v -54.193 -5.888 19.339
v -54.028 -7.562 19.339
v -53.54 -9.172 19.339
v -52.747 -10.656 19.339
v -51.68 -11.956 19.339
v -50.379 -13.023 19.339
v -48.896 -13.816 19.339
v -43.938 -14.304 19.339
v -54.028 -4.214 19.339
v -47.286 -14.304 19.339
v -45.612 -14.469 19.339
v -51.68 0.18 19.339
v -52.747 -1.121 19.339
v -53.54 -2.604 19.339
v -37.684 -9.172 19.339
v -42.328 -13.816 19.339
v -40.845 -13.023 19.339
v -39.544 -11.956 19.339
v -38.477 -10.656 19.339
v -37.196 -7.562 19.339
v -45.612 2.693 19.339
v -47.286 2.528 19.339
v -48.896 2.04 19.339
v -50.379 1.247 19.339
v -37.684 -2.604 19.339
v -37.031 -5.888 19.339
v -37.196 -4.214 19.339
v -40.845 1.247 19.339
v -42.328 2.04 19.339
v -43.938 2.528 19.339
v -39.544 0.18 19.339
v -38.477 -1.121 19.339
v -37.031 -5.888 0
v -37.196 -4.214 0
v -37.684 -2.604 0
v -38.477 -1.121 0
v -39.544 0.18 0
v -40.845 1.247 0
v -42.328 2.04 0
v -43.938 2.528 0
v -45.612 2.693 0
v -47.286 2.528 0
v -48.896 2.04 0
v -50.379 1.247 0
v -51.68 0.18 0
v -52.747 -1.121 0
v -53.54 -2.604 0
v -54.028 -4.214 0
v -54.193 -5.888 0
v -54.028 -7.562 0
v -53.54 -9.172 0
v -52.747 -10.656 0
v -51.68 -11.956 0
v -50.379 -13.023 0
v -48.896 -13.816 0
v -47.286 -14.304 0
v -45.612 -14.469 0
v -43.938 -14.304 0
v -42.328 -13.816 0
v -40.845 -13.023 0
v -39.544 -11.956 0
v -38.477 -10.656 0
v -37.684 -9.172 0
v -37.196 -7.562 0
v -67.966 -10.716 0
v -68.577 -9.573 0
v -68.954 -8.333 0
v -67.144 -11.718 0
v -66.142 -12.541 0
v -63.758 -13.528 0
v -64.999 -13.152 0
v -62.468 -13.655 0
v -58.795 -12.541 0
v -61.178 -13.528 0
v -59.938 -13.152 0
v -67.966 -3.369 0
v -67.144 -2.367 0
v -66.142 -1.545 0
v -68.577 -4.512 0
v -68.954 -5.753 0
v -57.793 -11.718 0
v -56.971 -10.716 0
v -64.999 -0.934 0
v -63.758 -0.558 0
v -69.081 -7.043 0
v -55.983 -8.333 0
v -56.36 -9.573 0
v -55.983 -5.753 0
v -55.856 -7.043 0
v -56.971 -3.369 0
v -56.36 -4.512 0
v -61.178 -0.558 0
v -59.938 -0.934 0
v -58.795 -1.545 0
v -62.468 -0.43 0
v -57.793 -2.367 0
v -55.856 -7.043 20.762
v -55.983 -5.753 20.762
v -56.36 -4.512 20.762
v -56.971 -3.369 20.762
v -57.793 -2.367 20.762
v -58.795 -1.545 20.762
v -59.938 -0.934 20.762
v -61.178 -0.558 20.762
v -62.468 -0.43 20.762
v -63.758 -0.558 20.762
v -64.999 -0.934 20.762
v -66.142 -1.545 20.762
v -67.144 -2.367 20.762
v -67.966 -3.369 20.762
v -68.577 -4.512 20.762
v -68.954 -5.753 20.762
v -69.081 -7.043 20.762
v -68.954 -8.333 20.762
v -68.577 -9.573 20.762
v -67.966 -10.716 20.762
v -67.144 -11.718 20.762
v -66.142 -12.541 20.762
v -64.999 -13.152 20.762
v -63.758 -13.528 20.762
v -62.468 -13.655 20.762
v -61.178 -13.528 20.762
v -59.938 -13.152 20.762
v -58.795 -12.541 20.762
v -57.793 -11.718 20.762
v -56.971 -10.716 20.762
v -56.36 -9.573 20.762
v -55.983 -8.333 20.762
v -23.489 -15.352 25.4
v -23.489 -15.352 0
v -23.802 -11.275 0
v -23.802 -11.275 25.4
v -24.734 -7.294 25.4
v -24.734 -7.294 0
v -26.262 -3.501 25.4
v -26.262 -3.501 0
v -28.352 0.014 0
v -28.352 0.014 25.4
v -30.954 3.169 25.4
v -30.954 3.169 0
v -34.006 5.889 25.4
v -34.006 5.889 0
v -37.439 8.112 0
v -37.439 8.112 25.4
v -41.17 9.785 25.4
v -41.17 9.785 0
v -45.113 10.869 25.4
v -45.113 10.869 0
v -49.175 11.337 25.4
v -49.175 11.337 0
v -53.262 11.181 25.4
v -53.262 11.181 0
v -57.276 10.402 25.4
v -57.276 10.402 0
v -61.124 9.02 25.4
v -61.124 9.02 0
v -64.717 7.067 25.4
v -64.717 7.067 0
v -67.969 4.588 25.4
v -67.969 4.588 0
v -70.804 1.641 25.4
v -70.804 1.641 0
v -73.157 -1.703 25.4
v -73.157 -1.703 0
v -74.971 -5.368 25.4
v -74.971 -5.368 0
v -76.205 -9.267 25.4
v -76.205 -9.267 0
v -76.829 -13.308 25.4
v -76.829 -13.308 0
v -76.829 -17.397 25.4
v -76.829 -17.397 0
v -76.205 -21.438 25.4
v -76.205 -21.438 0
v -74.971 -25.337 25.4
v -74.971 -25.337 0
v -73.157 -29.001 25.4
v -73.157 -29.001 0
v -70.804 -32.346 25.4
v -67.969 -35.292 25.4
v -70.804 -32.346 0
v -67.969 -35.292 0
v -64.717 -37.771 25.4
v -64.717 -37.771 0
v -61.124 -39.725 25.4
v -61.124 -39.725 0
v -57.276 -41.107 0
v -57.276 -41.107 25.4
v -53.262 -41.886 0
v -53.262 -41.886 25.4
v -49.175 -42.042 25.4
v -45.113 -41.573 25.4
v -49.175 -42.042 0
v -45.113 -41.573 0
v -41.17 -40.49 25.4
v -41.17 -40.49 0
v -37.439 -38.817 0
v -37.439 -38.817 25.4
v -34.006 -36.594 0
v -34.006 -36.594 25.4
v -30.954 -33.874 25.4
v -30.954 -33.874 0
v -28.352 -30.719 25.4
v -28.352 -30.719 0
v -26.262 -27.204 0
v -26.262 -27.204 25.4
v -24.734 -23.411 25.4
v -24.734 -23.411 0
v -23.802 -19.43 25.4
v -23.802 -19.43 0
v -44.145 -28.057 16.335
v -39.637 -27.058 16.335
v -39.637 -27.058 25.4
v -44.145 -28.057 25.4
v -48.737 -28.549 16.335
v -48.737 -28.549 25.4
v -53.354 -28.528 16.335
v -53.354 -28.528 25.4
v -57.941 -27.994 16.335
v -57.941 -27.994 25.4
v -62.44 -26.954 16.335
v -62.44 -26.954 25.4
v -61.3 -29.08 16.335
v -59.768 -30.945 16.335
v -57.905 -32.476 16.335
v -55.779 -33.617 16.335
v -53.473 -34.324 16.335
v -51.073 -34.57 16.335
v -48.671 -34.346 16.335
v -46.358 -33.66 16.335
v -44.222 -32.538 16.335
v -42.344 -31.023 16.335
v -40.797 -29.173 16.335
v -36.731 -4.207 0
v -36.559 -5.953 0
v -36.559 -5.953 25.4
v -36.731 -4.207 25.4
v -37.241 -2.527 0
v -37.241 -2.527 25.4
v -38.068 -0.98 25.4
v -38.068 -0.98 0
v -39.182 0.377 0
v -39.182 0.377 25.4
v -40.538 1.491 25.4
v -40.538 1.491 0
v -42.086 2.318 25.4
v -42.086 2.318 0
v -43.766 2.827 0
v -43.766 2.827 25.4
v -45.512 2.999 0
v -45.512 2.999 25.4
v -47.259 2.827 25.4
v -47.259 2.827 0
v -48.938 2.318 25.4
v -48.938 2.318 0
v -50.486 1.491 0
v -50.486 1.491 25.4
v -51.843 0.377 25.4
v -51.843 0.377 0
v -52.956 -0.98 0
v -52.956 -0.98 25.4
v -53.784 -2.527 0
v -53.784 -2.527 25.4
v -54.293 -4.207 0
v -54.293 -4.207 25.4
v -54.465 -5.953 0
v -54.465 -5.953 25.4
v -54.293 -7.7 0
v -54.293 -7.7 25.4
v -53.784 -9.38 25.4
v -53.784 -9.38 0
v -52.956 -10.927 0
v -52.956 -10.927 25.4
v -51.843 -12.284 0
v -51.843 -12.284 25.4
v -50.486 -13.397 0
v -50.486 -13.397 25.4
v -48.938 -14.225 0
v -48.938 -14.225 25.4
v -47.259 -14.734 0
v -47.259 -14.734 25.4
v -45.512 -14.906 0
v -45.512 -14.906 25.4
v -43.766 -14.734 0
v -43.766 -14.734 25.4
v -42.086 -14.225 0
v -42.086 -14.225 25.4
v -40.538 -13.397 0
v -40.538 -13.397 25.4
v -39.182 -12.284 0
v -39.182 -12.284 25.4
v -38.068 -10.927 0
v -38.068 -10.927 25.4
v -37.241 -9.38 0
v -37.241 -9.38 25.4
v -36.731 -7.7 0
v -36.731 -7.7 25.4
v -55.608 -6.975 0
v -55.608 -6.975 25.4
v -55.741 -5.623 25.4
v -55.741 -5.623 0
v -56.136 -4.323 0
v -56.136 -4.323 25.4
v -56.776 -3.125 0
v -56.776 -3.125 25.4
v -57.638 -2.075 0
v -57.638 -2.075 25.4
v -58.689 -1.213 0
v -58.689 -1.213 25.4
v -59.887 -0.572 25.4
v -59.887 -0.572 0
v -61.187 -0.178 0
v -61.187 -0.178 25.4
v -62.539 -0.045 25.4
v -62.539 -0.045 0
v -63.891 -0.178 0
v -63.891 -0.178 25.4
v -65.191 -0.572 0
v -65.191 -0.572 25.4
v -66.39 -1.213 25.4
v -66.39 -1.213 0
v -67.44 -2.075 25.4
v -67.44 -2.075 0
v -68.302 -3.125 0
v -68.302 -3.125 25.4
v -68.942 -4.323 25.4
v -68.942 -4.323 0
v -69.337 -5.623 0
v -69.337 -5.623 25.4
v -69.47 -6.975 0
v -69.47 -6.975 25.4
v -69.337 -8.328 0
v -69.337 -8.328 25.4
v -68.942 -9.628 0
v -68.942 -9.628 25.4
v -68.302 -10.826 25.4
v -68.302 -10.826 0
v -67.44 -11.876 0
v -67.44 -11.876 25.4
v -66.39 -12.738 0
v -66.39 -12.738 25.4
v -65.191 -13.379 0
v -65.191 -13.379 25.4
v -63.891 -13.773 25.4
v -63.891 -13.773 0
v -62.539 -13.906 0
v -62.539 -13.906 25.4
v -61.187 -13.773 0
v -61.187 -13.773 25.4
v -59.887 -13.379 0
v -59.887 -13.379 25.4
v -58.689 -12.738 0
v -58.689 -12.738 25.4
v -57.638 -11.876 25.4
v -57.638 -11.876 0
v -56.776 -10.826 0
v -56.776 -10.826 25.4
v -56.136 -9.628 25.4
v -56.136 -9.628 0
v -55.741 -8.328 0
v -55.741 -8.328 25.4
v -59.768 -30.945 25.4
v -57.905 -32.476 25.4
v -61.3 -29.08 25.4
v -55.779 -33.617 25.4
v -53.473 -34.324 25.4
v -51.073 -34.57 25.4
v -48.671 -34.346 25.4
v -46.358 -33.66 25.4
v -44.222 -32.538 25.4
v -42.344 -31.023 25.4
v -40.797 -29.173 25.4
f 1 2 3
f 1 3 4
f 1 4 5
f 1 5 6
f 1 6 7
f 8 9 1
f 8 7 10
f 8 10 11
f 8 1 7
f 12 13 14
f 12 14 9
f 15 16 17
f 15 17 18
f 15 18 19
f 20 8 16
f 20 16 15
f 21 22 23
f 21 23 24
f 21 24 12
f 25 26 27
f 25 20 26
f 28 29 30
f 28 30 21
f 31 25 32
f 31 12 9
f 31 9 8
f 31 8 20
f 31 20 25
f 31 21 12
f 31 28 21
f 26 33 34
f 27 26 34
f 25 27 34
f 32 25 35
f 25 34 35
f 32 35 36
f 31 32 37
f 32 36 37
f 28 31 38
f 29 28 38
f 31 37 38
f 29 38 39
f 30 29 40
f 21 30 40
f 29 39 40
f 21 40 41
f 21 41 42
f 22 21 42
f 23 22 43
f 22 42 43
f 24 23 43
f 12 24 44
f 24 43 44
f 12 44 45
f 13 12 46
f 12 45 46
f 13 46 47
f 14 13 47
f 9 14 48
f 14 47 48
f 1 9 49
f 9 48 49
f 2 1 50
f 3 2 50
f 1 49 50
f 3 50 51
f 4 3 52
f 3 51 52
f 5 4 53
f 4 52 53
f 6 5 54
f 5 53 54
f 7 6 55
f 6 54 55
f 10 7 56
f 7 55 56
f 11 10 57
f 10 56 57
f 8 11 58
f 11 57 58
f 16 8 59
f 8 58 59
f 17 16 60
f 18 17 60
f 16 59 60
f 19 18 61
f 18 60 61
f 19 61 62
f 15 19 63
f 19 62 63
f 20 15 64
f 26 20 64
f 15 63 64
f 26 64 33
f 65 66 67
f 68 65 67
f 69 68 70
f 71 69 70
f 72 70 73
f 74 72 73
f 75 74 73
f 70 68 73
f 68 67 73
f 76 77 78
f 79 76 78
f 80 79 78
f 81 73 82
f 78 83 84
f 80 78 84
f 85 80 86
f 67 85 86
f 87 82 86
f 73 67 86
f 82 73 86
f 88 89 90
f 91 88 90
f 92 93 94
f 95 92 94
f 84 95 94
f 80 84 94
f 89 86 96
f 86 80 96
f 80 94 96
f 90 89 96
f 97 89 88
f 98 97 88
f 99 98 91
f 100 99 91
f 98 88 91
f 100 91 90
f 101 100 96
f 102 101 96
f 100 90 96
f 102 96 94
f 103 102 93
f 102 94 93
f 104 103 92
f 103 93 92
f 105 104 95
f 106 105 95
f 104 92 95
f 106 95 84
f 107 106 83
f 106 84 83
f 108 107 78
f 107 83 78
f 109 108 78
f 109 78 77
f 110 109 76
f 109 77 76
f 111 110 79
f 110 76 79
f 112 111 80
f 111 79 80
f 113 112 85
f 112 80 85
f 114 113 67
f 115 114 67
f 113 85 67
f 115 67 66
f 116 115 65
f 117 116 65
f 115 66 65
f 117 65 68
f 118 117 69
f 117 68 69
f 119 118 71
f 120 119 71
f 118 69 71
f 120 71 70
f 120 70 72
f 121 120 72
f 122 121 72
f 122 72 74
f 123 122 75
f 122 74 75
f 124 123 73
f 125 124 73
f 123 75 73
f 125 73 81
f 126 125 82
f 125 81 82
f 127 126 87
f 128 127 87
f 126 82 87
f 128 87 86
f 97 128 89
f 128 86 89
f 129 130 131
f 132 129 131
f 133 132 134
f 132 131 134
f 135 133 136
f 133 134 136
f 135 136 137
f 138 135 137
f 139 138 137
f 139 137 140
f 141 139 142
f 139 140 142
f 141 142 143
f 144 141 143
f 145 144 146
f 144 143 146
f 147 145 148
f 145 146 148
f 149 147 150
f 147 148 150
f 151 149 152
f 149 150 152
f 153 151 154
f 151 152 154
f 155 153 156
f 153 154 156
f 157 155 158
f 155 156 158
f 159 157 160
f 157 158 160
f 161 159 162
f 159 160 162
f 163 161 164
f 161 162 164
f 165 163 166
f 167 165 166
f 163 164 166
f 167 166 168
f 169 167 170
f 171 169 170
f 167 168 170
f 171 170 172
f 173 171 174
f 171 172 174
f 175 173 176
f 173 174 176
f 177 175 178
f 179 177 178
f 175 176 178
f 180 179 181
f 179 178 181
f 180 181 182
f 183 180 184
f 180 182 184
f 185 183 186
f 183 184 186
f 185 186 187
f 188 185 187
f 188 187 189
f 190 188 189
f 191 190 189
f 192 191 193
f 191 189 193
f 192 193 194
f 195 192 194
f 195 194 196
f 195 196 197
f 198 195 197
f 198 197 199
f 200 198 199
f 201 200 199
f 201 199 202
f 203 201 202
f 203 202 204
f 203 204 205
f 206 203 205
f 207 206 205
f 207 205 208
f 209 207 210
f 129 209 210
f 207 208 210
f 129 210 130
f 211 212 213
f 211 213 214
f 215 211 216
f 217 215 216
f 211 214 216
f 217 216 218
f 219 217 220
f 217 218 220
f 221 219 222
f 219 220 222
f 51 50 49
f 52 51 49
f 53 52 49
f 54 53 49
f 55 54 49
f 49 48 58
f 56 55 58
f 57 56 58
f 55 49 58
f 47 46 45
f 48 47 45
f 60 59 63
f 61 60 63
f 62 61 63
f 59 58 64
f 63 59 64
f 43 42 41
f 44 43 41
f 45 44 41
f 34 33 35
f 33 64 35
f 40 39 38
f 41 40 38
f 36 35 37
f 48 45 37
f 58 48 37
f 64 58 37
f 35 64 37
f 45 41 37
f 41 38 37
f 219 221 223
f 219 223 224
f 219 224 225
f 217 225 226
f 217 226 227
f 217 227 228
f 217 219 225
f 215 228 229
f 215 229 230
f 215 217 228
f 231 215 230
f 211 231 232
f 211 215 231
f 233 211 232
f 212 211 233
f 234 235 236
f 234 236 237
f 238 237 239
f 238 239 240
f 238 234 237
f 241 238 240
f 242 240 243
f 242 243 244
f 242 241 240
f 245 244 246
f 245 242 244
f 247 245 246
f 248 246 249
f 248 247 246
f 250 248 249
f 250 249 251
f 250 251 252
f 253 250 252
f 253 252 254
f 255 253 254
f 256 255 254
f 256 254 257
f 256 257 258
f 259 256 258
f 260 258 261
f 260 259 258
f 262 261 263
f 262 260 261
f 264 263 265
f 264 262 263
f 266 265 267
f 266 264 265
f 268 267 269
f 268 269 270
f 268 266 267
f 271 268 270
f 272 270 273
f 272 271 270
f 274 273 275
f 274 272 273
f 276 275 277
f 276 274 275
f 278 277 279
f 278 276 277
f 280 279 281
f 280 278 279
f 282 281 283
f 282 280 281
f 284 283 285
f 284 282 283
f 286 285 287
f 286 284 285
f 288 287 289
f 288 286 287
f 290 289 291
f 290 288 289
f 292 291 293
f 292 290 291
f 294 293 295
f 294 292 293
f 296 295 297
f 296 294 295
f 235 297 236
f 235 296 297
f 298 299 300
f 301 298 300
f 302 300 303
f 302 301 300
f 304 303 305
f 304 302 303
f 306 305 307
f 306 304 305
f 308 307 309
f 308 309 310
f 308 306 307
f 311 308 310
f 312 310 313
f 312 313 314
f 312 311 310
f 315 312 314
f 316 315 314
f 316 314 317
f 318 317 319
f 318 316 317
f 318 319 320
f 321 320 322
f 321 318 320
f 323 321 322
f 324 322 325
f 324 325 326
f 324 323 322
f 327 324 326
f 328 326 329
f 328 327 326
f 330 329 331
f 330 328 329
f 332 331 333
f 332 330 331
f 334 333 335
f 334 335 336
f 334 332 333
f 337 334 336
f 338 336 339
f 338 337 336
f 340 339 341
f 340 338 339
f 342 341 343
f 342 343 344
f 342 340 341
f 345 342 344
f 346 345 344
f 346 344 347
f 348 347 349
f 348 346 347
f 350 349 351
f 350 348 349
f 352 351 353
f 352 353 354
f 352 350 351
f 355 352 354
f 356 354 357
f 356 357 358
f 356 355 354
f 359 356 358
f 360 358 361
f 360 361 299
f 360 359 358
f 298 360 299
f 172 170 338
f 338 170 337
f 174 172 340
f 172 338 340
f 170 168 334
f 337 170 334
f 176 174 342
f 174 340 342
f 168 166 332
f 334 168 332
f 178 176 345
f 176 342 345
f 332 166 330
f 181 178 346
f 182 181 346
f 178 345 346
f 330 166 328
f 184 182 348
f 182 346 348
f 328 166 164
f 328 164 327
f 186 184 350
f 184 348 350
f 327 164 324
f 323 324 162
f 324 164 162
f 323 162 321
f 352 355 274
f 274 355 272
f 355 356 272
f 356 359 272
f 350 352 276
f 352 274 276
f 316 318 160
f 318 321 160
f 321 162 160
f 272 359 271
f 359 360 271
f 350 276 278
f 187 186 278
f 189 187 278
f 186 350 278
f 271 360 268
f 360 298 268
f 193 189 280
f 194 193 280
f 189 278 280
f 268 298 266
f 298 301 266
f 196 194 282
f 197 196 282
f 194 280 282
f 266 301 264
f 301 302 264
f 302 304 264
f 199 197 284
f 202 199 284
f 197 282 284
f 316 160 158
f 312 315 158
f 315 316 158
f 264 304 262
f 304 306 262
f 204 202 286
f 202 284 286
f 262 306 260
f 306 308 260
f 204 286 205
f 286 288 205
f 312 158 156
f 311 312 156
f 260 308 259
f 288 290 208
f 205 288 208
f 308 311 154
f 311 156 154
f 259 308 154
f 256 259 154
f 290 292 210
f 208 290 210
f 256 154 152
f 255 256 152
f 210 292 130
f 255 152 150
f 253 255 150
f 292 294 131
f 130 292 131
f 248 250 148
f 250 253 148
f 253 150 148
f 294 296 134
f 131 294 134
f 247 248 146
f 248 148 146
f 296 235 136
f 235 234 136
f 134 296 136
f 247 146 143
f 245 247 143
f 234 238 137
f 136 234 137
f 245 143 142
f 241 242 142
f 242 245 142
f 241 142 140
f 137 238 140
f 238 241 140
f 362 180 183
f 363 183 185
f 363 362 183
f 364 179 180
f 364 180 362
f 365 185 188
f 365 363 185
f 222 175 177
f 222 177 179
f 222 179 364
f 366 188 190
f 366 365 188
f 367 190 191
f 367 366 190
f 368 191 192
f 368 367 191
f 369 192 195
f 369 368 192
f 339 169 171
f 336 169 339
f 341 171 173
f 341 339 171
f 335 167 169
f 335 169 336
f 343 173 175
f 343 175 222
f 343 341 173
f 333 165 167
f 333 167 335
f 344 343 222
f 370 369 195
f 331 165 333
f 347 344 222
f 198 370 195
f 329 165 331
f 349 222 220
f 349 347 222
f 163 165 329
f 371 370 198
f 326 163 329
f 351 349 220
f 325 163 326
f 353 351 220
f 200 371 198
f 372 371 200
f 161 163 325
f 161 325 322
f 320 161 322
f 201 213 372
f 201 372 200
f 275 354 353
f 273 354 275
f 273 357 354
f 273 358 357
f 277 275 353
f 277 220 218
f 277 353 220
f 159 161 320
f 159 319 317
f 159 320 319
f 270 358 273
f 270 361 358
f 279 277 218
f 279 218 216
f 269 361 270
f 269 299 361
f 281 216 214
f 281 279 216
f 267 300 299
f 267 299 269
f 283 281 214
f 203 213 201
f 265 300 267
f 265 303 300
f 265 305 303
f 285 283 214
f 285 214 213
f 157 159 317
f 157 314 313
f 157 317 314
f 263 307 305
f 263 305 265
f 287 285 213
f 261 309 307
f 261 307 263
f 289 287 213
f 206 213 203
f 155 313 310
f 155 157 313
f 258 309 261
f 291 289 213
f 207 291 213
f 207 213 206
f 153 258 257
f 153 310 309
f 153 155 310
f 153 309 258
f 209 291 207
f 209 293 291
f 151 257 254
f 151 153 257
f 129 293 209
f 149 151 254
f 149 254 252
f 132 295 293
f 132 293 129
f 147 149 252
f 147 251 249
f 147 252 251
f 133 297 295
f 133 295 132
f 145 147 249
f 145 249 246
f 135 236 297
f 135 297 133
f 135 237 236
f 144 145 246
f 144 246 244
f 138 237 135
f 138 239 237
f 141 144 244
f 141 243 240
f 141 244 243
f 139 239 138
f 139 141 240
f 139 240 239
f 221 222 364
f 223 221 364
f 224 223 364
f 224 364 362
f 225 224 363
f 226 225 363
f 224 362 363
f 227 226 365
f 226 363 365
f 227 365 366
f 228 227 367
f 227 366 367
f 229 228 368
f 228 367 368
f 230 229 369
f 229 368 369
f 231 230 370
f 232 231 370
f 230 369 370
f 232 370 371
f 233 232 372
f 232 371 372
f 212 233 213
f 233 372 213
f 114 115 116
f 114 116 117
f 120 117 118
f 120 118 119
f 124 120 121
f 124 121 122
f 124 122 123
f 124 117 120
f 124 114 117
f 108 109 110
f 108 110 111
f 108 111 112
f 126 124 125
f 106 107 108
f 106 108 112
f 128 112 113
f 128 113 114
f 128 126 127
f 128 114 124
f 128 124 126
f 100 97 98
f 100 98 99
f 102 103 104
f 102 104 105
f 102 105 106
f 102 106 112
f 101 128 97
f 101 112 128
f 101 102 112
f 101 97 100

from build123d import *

# Parameters (mm, degrees)
F1_R     = 26.709428
F1_R_2   = 6.930794
F1_R_3   = 8.952861
F2_DEPTH = 25.4
F5_DEPTH = 9.06525
F3_R     = 6.612231
F6_DEPTH = 20.76191
F7_R     = 8.580999
F8_DEPTH = 19.33853


with BuildPart() as f2:
    # F1 (on face) → F2 (new body)
    with BuildSketch(Plane.XY):
        with Locations((-50.198372, -15.352337)):
            Circle(F1_R)
        with Locations((-62.539048, -6.975438)):
            Circle(F1_R_2, mode=Mode.SUBTRACT)
        with Locations((-45.512266, -5.95345)):
            Circle(F1_R_3, mode=Mode.SUBTRACT)
    extrude(amount=F2_DEPTH)

    # F4 (on face) → F5 (cut)
    with BuildSketch(Plane.XY.offset(25.4)):
        with BuildLine():
            ThreePointArc((-39.636977, -27.05759), (-51.045704, -28.602566), (-62.439963, -26.954271))
            ThreePointArc((-62.439963, -26.954271), (-51.072744, -34.570419), (-39.636977, -27.05759))
        make_face()
    extrude(amount=-F5_DEPTH, mode=Mode.SUBTRACT)


with BuildPart() as f6:
    # F3 (on face) → F6 (new body)
    with BuildSketch(Plane.XY):
        with Locations((-62.468447, -7.042727)):
            Circle(F3_R)
    extrude(amount=F6_DEPTH)


with BuildPart() as f8:
    # F7 (on face) → F8 (new body)
    with BuildSketch(Plane.XY):
        with Locations((-45.612082, -5.888182)):
            Circle(F7_R)
    extrude(amount=F8_DEPTH)


solid = Compound([f2.part, f6.part, f8.part])
